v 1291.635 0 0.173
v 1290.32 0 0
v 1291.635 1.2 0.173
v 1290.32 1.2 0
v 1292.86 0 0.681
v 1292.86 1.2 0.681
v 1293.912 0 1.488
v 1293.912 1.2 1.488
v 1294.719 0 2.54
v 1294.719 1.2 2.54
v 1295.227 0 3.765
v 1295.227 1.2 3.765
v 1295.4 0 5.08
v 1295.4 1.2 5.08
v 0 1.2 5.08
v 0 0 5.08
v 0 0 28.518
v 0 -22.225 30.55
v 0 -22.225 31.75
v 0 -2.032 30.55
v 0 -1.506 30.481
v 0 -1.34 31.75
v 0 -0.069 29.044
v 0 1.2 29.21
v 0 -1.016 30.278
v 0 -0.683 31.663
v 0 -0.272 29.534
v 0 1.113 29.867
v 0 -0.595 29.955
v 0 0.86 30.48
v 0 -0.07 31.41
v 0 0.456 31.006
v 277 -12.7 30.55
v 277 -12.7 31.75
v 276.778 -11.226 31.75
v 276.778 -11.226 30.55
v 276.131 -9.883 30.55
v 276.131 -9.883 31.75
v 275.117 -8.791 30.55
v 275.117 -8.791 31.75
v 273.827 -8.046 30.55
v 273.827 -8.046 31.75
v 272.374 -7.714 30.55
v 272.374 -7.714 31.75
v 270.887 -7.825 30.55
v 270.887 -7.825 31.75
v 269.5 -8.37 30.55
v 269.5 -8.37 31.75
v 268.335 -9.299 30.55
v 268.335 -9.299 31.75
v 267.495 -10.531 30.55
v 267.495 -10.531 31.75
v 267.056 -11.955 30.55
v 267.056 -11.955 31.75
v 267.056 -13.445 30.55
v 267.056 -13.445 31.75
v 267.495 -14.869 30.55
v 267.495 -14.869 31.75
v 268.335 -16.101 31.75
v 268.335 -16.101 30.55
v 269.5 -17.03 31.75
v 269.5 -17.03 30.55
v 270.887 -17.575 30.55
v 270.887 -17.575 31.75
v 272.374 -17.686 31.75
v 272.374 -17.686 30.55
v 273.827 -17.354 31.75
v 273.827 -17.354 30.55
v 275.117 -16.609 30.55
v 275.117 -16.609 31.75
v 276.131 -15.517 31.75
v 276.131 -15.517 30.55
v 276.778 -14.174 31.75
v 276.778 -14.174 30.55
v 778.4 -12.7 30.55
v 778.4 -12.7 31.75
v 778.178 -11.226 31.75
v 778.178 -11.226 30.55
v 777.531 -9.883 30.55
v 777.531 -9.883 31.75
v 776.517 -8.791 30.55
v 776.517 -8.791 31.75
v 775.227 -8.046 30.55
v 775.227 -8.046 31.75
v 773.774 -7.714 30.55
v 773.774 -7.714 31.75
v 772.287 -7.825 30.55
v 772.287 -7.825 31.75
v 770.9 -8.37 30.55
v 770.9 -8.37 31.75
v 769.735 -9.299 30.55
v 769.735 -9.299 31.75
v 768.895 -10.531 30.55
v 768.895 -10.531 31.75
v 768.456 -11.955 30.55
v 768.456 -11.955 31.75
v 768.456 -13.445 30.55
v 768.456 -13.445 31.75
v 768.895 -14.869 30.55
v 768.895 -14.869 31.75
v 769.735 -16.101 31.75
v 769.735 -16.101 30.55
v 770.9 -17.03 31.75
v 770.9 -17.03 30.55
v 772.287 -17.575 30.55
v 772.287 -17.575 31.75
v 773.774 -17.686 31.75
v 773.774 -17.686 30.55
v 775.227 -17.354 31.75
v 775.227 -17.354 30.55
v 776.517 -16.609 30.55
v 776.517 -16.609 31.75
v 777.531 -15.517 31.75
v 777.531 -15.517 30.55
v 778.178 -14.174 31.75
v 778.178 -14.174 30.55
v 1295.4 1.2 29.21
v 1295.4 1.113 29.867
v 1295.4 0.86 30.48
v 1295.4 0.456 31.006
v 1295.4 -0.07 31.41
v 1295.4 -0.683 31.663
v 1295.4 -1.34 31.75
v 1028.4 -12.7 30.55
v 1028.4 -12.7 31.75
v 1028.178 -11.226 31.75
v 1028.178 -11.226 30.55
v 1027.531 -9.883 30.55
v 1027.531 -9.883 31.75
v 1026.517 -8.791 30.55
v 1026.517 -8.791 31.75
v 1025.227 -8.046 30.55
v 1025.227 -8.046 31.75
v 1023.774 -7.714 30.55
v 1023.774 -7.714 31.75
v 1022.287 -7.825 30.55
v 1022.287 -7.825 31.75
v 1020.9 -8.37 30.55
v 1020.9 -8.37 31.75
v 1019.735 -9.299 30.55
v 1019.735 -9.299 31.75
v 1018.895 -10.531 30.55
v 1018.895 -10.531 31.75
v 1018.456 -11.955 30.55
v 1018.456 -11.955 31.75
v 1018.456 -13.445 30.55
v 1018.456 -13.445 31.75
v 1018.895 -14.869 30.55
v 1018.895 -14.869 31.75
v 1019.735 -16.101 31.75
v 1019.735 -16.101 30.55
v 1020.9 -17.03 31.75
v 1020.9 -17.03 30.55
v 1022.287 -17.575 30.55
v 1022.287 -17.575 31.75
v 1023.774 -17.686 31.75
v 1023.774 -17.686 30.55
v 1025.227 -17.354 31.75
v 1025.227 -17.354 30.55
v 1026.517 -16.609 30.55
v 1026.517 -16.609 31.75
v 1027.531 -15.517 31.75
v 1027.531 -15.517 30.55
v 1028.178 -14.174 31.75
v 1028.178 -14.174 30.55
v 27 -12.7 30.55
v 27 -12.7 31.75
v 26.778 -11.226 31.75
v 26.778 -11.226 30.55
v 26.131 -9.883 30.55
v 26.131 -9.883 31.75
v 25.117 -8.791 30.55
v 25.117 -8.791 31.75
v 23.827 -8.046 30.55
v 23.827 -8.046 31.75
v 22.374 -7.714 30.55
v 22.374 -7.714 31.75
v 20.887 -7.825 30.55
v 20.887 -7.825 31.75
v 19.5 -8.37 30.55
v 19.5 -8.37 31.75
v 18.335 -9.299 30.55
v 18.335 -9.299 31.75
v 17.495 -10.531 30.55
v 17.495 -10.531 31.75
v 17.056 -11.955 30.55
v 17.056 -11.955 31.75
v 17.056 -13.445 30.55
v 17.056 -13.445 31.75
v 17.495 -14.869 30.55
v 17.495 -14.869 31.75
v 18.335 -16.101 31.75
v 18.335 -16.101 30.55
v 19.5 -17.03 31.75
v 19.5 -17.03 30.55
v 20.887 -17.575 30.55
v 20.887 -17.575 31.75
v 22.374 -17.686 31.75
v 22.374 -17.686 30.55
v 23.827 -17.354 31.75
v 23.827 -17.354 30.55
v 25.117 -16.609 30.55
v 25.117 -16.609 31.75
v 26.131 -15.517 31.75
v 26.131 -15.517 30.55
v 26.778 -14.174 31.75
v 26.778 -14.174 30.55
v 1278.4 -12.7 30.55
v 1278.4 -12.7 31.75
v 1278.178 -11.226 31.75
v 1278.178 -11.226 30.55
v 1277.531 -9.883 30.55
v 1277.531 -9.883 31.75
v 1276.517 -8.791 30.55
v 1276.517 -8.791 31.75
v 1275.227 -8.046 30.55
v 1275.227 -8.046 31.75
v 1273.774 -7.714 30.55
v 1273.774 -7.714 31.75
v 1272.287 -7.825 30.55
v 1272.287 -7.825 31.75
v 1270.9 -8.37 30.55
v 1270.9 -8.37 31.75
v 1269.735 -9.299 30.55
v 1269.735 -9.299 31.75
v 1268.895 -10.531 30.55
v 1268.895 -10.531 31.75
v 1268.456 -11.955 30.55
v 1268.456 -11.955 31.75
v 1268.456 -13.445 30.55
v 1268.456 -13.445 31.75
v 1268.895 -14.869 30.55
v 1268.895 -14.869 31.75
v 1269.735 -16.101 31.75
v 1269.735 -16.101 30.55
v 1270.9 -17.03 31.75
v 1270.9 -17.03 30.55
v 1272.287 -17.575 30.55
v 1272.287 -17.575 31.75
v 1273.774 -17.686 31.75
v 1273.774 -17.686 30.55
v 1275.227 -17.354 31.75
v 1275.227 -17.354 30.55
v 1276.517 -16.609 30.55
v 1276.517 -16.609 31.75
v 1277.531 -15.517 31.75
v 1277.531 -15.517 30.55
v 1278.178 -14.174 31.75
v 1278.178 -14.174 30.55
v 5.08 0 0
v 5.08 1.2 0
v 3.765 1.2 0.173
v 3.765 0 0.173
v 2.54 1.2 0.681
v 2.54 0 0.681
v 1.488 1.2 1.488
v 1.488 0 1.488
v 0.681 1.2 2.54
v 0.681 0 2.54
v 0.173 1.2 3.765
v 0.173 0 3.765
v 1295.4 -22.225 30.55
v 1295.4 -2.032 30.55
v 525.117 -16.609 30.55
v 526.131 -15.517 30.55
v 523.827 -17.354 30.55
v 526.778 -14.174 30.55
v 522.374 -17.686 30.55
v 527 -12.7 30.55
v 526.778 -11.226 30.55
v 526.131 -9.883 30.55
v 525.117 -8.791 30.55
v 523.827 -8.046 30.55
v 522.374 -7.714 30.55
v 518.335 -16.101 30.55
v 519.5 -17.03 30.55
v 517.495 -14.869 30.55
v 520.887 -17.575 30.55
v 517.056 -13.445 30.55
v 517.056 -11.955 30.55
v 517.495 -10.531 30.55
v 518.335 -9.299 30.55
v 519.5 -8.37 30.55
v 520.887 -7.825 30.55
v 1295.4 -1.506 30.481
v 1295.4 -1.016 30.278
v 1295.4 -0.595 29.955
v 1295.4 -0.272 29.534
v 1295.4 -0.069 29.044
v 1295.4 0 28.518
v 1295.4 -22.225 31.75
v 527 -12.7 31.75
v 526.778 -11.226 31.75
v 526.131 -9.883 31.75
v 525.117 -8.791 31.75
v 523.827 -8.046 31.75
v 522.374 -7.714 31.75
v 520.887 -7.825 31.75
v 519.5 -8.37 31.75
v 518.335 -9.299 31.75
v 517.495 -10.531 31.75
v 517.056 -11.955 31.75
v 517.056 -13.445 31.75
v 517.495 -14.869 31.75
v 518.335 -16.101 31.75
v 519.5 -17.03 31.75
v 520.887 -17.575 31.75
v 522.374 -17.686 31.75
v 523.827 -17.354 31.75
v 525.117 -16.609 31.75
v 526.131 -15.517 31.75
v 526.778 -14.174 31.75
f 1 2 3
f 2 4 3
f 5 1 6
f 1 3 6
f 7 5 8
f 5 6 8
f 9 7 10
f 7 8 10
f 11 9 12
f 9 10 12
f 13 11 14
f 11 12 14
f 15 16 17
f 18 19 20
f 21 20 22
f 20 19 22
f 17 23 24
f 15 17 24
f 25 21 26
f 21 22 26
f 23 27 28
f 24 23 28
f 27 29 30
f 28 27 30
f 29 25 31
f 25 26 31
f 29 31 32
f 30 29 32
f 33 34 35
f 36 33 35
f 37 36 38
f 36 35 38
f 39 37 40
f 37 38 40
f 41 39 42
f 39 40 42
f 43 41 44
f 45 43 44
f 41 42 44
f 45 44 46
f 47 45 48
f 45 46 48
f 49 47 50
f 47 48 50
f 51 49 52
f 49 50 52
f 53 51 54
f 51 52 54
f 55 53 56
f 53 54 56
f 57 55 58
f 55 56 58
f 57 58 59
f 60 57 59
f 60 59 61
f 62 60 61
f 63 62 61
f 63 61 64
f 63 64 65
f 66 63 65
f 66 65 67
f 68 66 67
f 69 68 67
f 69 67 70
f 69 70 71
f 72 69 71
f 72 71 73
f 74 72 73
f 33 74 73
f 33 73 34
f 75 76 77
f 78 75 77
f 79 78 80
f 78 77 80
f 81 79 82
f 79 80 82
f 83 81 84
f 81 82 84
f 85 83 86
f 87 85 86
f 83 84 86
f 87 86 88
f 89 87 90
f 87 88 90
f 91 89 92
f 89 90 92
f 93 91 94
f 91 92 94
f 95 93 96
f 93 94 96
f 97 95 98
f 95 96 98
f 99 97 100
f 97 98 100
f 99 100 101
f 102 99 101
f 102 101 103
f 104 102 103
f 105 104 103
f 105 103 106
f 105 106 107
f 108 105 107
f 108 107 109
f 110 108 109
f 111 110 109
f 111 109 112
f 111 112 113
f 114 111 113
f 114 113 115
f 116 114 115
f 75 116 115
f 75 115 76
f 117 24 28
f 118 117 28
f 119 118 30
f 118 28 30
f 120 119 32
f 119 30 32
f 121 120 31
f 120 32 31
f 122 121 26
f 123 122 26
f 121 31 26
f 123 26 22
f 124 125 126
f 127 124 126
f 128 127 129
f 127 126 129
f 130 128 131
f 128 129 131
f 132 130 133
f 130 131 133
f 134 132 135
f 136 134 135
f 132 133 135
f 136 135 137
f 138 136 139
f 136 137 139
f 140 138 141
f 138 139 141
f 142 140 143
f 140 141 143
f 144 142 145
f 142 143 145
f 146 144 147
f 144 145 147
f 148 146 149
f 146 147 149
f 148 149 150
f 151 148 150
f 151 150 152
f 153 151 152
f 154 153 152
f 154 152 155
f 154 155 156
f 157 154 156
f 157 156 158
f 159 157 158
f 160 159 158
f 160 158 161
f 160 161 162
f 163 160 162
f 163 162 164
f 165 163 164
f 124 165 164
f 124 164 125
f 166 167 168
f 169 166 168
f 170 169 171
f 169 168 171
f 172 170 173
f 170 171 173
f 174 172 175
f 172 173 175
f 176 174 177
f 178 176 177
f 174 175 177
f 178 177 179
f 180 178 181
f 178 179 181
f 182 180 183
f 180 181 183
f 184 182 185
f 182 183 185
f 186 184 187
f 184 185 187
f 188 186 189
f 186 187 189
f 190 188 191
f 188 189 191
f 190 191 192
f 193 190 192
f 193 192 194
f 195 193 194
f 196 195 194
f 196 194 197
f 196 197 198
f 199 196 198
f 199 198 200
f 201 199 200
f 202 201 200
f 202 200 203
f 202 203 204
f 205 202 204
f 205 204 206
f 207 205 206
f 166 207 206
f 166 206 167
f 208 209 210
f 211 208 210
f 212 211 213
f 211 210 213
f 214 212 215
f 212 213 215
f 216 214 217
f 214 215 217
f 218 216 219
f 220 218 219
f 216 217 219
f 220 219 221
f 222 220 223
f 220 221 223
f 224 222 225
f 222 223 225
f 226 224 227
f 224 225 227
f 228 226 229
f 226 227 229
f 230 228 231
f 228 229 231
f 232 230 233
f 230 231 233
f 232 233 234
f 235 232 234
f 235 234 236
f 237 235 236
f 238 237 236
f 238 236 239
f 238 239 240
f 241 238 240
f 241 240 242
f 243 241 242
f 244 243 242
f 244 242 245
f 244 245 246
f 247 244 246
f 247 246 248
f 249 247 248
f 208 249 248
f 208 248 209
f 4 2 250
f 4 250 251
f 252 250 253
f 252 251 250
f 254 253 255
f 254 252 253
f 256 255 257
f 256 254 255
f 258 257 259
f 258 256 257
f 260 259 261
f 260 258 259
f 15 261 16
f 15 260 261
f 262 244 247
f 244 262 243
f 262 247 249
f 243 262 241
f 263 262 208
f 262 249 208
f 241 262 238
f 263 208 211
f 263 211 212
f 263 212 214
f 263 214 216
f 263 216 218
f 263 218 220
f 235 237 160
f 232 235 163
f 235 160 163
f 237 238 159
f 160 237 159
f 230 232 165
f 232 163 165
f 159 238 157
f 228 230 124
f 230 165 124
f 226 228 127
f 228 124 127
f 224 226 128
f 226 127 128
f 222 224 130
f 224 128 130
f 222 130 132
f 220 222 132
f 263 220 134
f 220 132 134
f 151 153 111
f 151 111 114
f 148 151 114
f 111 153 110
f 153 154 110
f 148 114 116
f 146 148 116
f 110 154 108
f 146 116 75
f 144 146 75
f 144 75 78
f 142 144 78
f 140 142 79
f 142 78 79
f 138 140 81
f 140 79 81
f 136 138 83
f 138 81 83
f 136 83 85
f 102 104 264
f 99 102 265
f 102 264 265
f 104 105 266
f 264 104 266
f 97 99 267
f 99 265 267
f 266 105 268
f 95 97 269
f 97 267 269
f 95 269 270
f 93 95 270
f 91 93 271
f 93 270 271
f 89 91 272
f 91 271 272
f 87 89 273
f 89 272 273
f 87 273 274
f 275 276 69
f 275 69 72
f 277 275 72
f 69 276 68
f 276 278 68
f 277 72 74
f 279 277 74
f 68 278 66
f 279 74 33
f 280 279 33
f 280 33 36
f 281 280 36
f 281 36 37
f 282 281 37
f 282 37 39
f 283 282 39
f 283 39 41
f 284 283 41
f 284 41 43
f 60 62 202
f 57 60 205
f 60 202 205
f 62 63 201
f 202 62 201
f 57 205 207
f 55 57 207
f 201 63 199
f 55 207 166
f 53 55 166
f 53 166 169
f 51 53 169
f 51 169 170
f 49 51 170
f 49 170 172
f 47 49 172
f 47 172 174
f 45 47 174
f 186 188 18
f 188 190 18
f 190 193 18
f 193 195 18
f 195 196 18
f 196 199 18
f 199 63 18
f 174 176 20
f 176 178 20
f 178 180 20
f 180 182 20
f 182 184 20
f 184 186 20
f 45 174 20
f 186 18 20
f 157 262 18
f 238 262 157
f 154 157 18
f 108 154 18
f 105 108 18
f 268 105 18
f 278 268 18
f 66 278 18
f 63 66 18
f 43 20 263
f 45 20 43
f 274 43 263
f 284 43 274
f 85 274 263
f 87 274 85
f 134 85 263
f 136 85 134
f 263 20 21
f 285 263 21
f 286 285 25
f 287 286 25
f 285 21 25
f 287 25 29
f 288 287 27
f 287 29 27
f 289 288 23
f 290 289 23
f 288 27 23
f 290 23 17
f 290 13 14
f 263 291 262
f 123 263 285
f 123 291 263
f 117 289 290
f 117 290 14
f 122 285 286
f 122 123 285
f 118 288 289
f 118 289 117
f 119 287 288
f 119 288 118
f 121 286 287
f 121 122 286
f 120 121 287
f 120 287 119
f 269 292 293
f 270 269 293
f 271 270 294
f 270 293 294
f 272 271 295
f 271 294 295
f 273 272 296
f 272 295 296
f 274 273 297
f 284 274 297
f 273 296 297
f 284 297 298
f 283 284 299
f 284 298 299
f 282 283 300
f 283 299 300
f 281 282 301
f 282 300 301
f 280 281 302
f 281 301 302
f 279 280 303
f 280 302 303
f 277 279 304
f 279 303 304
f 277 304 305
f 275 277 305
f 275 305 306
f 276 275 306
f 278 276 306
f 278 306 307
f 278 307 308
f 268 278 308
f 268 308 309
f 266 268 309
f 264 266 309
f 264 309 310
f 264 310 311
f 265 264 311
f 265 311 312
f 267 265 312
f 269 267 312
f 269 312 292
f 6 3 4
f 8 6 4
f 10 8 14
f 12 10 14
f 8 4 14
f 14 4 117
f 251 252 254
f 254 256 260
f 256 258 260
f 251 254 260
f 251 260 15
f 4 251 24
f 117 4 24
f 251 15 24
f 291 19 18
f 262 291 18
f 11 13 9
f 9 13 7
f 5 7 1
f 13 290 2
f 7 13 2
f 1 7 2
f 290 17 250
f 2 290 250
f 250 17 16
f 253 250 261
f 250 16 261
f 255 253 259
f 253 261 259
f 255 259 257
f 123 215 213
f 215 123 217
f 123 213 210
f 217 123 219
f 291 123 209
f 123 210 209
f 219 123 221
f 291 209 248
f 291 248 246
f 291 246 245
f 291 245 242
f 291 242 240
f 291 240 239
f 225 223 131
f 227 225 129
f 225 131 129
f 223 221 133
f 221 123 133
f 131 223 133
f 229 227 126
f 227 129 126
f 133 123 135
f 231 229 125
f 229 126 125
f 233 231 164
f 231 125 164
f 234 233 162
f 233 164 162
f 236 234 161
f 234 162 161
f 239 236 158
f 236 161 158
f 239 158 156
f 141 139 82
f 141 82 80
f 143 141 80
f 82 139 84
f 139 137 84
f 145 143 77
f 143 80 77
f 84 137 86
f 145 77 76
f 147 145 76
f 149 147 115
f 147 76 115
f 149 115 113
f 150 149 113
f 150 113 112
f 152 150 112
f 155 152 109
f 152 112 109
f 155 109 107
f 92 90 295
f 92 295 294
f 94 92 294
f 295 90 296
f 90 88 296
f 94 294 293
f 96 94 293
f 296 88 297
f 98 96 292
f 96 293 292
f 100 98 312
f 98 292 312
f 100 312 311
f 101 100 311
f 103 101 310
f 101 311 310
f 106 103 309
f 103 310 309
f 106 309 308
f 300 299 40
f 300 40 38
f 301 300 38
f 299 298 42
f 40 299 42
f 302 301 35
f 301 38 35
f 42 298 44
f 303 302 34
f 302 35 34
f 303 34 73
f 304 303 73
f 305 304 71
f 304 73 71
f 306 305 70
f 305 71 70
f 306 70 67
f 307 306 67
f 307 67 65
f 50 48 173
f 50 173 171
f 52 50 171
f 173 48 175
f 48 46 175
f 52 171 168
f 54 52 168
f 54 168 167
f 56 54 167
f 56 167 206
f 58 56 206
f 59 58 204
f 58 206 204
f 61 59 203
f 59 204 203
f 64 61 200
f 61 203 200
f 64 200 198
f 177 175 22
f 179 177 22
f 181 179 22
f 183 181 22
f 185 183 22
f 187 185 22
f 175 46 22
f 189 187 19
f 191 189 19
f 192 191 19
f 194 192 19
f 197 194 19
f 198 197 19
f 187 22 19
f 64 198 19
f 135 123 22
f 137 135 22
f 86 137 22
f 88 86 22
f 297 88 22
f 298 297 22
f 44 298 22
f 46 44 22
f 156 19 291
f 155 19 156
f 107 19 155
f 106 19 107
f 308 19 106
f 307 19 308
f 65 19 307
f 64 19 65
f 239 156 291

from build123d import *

# Parameters (mm, degrees)
F1_DEPTH = 1295.4
F2_R     = 5
F3_DEPTH = 25.4
F4_R     = 5.08


with BuildPart() as f1:
    # F0 (on Right) → F1 (new body)
    with BuildSketch(Plane.YZ):
        with BuildLine():
            Line((0, 28.518), (0, 0))
            Line((0, 0), (1.2, 0))
            Line((1.2, 0), (1.2, 29.21))
            ThreePointArc((1.2, 29.21), (0.456051, 31.006051), (-1.34, 31.75))
            Line((-1.34, 31.75), (-22.225, 31.75))
            Line((-22.225, 31.75), (-22.225, 30.55))
            Line((-22.225, 30.55), (-2.032, 30.55))
            ThreePointArc((-2.032, 30.55), (-0.595159, 29.954841), (0, 28.518))
        make_face()
    extrude(amount=F1_DEPTH)

    # F2 (on face) → F3 (cut)
    with BuildSketch(Plane.XY.offset(31.75)):
        with Locations((22, -12.7)):
            Circle(F2_R)
        with Locations((272, -12.7)):
            Circle(F2_R)
        with Locations((522, -12.7)):
            Circle(F2_R)
        with Locations((1273.4, -12.7)):
            Circle(F2_R)
        with Locations((1023.4, -12.7)):
            Circle(F2_R)
        with Locations((773.4, -12.7)):
            Circle(F2_R)
    extrude(amount=-F3_DEPTH, mode=Mode.SUBTRACT)

    # F4
    f4_edges = [f1.edges().sort_by_distance(p)[0] for p in [
        (1295.4, 0.6, 0),
        (0, 0.6, 0),
    ]]
    fillet(f4_edges, radius=F4_R)


solid = f1.part
